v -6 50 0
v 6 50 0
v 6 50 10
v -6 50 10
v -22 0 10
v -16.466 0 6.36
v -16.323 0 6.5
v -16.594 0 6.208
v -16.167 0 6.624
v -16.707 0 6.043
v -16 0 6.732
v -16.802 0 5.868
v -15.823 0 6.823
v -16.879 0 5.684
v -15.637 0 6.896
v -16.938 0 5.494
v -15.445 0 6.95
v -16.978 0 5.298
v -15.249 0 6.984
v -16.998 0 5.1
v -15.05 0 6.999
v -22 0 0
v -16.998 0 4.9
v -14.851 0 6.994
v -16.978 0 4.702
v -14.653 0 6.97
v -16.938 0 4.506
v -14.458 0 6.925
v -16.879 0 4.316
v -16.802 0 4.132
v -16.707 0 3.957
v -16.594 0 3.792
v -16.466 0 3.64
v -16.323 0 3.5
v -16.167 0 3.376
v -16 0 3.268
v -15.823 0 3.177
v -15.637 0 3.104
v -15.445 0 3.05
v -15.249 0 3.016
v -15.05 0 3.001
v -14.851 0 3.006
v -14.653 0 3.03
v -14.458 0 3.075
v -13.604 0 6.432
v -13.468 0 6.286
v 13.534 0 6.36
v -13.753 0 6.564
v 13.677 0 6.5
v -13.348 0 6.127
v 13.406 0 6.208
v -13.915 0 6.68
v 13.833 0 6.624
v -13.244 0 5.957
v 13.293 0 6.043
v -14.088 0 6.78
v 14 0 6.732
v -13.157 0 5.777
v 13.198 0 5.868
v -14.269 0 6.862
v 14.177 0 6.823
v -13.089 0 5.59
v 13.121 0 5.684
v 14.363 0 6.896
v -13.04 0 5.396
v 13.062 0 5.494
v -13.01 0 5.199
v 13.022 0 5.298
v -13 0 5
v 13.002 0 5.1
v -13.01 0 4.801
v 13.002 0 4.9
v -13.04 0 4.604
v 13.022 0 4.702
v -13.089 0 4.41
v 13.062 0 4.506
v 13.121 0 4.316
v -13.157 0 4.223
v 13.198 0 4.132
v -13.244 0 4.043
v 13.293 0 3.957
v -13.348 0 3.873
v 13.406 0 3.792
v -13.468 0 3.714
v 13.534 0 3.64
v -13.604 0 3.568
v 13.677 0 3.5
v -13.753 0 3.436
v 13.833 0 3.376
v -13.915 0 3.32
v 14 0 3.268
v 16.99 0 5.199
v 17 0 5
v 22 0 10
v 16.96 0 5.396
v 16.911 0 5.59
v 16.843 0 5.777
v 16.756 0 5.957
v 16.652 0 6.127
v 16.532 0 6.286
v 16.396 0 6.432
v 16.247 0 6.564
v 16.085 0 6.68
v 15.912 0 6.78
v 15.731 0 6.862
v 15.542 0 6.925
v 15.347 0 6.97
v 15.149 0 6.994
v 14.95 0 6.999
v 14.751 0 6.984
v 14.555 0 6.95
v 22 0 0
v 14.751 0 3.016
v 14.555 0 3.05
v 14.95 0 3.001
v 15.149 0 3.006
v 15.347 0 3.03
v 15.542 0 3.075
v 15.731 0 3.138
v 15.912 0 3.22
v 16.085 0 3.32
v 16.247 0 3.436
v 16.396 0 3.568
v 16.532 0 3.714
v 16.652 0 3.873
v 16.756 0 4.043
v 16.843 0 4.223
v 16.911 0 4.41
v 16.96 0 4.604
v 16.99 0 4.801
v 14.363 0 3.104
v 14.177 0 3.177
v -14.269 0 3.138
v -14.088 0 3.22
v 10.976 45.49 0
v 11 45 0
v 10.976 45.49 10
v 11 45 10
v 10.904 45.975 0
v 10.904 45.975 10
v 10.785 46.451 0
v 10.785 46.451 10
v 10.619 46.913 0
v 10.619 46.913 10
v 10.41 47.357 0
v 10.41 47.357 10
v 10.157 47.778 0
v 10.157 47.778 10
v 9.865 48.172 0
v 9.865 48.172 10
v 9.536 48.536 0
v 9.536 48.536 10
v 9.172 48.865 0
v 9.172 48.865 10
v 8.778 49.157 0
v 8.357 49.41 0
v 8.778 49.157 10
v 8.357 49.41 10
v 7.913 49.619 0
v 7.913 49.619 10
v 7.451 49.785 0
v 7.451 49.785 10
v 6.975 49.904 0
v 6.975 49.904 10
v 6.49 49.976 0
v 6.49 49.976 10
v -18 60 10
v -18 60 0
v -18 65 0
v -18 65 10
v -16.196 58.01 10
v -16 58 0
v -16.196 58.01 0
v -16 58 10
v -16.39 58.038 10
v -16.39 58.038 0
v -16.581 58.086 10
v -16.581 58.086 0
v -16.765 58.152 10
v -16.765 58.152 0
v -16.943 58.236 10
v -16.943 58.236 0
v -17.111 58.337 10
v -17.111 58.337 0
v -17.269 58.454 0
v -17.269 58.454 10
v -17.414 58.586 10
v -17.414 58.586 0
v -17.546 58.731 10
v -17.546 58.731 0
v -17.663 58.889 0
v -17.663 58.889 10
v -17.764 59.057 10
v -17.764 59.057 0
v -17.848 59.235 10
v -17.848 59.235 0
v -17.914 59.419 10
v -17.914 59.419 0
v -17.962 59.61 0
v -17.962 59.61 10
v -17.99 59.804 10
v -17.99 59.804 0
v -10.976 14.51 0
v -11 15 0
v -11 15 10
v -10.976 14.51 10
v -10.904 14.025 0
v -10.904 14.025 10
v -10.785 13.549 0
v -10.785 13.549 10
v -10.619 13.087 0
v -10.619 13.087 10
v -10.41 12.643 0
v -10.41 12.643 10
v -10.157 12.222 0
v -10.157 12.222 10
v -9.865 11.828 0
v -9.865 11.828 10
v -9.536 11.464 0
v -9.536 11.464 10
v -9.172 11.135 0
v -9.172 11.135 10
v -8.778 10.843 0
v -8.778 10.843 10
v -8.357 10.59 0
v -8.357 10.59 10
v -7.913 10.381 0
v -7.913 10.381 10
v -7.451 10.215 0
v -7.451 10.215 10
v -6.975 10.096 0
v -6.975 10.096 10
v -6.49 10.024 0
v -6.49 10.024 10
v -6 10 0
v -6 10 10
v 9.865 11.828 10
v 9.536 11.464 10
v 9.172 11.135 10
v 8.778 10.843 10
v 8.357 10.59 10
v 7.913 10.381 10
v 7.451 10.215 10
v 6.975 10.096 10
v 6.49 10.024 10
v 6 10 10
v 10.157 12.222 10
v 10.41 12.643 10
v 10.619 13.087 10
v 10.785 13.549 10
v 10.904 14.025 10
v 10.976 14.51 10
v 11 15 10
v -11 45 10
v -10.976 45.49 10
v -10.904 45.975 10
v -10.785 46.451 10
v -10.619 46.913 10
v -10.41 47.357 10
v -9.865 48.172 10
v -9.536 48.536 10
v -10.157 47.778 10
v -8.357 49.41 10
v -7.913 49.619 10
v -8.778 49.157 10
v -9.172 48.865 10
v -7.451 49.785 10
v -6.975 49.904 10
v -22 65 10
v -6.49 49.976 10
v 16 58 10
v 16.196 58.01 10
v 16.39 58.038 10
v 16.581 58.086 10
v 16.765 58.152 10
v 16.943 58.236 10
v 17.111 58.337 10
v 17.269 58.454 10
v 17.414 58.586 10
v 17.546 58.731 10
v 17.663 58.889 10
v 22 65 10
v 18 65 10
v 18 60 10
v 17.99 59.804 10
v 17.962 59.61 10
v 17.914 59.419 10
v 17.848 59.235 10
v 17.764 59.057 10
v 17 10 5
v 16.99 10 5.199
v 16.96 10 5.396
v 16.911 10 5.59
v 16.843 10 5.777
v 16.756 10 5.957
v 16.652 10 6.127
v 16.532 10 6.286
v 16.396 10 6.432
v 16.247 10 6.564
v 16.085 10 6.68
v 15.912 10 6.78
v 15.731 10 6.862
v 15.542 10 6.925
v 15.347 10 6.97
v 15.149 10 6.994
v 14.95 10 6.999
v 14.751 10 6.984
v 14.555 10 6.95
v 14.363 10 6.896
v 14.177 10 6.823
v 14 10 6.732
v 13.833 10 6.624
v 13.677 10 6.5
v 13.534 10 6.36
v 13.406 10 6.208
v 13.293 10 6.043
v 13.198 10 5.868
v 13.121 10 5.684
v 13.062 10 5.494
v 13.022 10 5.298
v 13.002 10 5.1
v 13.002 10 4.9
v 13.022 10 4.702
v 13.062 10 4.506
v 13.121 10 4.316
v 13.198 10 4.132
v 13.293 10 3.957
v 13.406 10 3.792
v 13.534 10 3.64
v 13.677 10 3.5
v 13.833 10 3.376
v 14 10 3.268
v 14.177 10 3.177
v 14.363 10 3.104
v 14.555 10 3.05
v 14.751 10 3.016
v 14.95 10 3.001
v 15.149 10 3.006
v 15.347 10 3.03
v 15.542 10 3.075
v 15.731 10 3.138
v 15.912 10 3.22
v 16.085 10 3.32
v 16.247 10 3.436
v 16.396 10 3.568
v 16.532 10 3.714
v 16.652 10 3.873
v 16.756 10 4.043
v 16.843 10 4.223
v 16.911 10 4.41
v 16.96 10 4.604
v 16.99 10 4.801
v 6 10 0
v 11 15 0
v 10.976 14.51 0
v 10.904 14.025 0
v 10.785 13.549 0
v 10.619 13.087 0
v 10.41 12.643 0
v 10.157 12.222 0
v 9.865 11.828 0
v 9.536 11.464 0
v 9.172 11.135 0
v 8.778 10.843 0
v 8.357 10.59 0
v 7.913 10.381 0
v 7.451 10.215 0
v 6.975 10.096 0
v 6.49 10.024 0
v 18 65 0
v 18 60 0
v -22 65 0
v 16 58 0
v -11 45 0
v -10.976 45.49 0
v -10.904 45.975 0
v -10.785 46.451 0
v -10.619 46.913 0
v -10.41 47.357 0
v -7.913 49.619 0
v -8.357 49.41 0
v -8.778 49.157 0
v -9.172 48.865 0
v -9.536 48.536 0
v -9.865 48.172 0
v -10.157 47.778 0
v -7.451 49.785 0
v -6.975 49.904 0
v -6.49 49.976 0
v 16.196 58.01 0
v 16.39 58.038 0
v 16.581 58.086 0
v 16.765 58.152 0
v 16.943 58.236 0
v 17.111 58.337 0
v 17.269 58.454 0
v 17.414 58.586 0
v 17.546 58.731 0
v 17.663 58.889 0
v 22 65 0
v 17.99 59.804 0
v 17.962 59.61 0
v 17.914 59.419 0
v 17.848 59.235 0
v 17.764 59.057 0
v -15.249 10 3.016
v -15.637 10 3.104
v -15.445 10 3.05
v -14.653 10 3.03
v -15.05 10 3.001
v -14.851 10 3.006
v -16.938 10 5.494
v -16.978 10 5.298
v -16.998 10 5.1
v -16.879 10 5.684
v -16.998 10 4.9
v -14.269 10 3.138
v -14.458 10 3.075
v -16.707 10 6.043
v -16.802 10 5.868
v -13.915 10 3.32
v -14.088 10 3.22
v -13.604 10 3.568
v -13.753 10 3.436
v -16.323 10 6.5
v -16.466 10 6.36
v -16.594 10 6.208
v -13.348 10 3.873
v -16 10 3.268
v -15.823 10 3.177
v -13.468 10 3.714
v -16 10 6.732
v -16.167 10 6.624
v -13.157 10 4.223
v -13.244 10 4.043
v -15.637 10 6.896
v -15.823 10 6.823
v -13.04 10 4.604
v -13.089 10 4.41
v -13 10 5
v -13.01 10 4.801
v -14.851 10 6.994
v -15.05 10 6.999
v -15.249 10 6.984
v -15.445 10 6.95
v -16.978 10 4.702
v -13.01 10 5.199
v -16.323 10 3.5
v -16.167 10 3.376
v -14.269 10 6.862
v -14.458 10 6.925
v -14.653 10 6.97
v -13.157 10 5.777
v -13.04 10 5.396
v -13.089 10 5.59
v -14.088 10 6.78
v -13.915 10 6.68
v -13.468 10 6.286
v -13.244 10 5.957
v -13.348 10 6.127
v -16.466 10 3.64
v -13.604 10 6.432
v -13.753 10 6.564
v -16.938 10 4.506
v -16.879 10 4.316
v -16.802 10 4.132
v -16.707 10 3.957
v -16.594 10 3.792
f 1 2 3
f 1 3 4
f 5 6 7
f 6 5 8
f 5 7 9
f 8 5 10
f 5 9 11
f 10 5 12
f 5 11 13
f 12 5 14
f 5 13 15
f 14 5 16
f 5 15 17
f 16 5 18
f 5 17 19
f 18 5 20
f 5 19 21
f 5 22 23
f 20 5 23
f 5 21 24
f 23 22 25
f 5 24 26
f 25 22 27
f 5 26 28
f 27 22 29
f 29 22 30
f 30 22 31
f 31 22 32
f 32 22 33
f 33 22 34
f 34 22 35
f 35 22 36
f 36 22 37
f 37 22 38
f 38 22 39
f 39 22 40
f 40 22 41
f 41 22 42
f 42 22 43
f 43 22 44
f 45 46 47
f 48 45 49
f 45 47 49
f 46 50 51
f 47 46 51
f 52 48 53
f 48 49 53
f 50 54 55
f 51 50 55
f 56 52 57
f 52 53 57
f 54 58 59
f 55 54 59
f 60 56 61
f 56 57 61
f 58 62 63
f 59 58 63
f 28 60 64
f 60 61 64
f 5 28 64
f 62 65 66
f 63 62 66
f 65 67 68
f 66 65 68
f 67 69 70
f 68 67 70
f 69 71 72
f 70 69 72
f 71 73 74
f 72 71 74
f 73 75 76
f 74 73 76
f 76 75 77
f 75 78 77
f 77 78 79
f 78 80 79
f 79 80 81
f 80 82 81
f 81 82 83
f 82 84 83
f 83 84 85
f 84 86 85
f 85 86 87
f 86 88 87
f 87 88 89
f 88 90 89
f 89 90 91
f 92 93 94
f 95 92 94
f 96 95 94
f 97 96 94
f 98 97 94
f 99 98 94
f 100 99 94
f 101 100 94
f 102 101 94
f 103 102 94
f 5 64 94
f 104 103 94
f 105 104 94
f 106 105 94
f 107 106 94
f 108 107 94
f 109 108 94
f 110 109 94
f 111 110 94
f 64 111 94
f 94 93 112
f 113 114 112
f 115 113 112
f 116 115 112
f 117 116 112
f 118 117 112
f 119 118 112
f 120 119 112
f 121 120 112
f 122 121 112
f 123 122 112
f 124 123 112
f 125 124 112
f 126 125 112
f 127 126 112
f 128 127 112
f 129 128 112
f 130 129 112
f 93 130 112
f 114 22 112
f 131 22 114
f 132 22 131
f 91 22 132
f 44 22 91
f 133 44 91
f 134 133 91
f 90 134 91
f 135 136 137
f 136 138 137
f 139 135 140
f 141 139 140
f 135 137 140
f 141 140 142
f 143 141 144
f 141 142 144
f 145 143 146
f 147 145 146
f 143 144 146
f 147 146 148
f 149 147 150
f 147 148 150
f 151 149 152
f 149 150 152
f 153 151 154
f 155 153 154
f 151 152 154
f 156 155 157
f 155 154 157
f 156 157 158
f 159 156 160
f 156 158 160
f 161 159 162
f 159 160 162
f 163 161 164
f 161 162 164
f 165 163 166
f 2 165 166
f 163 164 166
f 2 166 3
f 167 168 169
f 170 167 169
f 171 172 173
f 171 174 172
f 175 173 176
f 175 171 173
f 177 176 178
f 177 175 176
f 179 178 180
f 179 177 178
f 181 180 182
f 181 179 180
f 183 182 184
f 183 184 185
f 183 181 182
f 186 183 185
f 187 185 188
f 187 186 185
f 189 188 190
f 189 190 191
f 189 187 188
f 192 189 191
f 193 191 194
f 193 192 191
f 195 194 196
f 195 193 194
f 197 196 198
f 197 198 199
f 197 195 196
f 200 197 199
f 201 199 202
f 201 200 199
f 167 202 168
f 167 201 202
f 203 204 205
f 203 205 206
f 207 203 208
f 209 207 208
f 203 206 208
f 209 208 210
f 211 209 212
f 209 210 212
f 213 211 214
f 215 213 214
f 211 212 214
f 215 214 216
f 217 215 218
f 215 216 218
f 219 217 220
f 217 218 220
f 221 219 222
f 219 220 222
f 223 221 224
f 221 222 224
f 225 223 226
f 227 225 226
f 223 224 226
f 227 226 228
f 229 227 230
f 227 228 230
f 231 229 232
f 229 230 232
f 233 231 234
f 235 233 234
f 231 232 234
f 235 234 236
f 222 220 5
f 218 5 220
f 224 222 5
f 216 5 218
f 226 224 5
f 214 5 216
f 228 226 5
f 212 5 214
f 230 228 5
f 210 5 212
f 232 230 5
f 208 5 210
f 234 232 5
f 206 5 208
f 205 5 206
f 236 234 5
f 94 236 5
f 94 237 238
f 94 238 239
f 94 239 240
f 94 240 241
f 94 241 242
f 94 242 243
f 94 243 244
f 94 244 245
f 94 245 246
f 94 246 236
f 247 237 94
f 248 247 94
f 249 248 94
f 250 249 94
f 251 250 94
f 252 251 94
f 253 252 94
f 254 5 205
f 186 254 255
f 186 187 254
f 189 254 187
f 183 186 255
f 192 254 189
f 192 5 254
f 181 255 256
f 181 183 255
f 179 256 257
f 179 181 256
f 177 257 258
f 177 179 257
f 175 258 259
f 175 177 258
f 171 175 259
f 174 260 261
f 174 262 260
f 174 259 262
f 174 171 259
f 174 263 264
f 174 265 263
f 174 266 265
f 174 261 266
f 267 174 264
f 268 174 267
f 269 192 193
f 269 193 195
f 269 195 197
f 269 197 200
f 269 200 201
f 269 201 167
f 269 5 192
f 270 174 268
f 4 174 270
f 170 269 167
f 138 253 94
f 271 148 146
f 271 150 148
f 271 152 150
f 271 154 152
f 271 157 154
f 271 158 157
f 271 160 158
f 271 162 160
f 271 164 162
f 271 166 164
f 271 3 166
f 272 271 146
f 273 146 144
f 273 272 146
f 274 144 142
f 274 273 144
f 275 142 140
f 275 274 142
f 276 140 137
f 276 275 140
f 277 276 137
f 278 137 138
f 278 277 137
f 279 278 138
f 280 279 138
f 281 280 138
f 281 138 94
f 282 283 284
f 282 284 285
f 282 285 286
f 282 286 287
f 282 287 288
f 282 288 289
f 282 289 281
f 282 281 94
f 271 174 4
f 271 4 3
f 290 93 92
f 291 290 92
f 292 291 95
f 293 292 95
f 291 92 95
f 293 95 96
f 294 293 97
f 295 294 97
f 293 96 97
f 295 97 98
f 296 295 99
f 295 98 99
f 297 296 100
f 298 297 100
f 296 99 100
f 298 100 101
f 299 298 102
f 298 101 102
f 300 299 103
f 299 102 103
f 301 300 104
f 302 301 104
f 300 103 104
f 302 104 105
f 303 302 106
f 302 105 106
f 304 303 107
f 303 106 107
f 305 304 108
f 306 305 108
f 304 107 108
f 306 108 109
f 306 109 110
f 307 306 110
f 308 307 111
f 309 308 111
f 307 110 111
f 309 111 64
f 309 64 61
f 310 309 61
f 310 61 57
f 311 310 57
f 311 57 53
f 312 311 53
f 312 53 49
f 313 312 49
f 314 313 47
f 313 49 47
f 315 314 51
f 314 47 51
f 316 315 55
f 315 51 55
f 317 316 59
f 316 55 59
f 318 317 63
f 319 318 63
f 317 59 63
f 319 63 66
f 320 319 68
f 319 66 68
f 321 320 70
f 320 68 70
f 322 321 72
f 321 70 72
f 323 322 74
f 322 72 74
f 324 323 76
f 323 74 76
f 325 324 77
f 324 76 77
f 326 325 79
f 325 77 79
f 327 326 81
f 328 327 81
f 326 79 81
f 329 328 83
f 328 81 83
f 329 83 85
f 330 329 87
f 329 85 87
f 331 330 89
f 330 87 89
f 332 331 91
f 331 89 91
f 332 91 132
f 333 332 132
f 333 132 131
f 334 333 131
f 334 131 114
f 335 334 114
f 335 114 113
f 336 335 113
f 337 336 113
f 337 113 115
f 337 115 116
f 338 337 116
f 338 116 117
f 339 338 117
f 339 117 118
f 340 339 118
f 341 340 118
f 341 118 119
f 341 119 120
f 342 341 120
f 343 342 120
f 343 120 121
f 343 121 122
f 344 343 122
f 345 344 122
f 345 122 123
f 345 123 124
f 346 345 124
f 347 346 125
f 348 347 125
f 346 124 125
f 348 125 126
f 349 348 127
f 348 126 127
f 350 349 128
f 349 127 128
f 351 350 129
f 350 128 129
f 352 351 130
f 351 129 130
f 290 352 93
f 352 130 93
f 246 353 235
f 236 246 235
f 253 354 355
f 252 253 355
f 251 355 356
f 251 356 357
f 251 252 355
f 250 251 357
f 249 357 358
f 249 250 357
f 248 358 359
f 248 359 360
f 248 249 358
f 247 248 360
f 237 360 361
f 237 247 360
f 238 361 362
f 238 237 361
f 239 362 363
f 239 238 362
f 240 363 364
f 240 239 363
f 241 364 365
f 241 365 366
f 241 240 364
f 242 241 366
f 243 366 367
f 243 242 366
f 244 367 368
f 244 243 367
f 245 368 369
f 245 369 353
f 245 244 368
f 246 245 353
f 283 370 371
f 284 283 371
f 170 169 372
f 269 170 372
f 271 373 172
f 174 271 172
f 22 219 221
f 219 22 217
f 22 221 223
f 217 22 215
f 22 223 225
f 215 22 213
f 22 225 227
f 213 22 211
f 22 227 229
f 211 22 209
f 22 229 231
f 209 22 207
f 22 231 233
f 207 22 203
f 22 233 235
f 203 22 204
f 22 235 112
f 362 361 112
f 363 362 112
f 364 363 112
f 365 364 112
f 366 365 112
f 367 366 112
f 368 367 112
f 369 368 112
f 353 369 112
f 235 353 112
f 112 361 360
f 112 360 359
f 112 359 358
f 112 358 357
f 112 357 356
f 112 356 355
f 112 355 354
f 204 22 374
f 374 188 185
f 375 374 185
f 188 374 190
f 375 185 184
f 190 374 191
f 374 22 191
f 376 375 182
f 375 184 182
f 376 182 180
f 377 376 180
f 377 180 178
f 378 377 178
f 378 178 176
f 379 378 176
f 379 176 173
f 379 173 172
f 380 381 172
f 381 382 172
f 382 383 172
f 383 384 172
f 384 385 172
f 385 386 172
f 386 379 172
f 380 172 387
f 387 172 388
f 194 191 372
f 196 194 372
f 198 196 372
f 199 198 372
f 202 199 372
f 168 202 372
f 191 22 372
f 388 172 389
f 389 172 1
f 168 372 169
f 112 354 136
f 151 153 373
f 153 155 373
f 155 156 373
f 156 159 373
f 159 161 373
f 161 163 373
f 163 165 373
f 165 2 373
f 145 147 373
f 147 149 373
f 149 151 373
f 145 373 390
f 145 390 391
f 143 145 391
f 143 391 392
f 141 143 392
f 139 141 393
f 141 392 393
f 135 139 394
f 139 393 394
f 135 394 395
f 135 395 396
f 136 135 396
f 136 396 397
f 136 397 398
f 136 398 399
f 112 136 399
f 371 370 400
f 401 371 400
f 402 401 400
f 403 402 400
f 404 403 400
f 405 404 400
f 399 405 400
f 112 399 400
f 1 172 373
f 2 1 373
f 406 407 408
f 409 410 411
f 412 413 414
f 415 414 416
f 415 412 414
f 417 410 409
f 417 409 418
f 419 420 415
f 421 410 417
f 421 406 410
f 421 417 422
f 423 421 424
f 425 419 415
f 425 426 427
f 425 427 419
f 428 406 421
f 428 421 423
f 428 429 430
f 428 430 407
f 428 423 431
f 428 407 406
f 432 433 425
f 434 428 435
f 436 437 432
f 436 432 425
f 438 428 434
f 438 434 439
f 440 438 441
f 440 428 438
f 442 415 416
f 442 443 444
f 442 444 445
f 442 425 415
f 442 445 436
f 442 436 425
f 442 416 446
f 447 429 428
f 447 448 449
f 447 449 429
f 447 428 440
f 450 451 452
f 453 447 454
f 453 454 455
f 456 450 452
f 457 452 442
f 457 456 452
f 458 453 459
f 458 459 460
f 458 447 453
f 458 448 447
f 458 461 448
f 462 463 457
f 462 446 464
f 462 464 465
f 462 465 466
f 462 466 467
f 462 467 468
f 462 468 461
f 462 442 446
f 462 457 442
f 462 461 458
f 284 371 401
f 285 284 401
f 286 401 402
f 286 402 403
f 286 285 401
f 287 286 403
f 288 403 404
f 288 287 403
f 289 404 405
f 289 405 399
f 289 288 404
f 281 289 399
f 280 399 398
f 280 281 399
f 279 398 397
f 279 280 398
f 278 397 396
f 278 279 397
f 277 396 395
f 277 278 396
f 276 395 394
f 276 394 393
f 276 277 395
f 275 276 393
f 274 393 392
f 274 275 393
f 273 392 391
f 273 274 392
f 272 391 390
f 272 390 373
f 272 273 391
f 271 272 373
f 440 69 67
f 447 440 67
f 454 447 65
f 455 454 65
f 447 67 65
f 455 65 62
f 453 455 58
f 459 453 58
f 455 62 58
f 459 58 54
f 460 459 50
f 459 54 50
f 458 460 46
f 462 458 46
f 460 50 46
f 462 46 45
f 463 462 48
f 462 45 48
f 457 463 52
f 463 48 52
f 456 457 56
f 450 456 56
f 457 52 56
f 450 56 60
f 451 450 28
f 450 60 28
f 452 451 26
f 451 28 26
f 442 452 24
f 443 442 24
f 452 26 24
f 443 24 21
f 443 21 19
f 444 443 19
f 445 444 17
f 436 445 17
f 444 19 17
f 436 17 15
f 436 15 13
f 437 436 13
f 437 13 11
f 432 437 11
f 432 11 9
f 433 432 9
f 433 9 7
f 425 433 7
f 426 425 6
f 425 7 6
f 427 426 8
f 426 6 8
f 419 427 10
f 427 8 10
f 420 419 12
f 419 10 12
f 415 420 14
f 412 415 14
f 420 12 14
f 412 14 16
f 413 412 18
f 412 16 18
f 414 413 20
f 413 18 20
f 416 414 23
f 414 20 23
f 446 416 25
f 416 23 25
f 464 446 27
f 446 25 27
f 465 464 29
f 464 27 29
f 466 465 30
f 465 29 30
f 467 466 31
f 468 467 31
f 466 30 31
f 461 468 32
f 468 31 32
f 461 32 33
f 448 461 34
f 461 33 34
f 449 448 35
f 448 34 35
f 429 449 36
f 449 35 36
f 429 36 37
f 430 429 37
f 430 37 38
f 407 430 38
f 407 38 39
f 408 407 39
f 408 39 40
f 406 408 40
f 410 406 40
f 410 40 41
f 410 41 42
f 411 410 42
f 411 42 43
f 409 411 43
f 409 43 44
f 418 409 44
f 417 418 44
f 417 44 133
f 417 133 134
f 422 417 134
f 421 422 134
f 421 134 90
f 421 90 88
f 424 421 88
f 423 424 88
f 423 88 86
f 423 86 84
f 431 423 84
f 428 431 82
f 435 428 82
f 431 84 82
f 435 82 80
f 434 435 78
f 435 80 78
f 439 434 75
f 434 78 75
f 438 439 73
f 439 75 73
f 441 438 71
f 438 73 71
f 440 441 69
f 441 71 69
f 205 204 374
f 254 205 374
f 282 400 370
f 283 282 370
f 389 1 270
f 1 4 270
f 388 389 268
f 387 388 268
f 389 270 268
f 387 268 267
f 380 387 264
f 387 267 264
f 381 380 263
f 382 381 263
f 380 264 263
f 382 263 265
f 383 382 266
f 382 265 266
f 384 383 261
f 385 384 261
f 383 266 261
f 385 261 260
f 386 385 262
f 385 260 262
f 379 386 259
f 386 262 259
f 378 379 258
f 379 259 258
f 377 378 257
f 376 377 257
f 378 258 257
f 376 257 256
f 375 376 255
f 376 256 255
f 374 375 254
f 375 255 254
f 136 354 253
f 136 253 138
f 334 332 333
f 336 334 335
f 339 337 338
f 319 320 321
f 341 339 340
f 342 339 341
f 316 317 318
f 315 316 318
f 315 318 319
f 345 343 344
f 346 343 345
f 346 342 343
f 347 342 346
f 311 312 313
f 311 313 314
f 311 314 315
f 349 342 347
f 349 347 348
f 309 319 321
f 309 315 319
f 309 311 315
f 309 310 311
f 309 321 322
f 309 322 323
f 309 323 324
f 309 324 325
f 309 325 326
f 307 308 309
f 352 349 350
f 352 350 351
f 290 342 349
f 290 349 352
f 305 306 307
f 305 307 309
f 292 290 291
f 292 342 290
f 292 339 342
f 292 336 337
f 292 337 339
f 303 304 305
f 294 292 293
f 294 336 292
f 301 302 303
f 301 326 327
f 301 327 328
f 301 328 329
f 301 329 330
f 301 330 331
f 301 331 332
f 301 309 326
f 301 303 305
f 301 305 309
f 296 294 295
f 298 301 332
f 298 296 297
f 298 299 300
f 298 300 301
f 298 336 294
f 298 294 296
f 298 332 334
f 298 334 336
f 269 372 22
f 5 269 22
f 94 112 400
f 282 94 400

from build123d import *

# Parameters (mm, degrees)
BOSS_EXTRUDE1_DEPTH = 10
SKETCH2_R           = 2
CUT_EXTRUDE1_DEPTH  = 10
FILLET1_R           = 2
SKETCH3_W           = 22
SKETCH3_H           = 40
CUT_EXTRUDE2_DEPTH  = 11
FILLET2_R           = 5


with BuildPart() as part:
    # Sketch1 → Boss-Extrude1 (new body)
    with BuildSketch(Plane.XY):
        Polygon((-22, 0), (22, 0), (22, 65), (18, 65), (18, 58), (-18, 58), (-18, 65), (-22, 65), align=None)
    extrude(amount=BOSS_EXTRUDE1_DEPTH)

    # Sketch2 → Cut-Extrude1 (cut)
    with BuildSketch(Plane.XZ):
        with Locations((15, 5)):
            Circle(SKETCH2_R)
        with Locations((-15, 5)):
            Circle(SKETCH2_R)
    extrude(amount=-CUT_EXTRUDE1_DEPTH, mode=Mode.SUBTRACT)

    # Fillet1
    fillet1_edges = [part.edges().sort_by_distance(p)[0] for p in [
        (-18, 58, 5),
        (18, 58, 5),
    ]]
    fillet(fillet1_edges, radius=FILLET1_R)

    # Sketch3 → Cut-Extrude2 (cut, through all)
    with BuildSketch(Plane(origin=(0, 0, 0), x_dir=(-1, 0, 0), z_dir=(0, 0, -1))):
        with Locations((0, 30)):
            Rectangle(SKETCH3_W, SKETCH3_H)
    extrude(amount=-CUT_EXTRUDE2_DEPTH, mode=Mode.SUBTRACT)

    # Fillet2
    fillet2_edges = [part.edges().sort_by_distance(p)[0] for p in [
        (11, 10, 5),
        (11, 50, 5),
        (-11, 50, 5),
        (-11, 10, 5),
    ]]
    fillet(fillet2_edges, radius=FILLET2_R)


solid = part.part
